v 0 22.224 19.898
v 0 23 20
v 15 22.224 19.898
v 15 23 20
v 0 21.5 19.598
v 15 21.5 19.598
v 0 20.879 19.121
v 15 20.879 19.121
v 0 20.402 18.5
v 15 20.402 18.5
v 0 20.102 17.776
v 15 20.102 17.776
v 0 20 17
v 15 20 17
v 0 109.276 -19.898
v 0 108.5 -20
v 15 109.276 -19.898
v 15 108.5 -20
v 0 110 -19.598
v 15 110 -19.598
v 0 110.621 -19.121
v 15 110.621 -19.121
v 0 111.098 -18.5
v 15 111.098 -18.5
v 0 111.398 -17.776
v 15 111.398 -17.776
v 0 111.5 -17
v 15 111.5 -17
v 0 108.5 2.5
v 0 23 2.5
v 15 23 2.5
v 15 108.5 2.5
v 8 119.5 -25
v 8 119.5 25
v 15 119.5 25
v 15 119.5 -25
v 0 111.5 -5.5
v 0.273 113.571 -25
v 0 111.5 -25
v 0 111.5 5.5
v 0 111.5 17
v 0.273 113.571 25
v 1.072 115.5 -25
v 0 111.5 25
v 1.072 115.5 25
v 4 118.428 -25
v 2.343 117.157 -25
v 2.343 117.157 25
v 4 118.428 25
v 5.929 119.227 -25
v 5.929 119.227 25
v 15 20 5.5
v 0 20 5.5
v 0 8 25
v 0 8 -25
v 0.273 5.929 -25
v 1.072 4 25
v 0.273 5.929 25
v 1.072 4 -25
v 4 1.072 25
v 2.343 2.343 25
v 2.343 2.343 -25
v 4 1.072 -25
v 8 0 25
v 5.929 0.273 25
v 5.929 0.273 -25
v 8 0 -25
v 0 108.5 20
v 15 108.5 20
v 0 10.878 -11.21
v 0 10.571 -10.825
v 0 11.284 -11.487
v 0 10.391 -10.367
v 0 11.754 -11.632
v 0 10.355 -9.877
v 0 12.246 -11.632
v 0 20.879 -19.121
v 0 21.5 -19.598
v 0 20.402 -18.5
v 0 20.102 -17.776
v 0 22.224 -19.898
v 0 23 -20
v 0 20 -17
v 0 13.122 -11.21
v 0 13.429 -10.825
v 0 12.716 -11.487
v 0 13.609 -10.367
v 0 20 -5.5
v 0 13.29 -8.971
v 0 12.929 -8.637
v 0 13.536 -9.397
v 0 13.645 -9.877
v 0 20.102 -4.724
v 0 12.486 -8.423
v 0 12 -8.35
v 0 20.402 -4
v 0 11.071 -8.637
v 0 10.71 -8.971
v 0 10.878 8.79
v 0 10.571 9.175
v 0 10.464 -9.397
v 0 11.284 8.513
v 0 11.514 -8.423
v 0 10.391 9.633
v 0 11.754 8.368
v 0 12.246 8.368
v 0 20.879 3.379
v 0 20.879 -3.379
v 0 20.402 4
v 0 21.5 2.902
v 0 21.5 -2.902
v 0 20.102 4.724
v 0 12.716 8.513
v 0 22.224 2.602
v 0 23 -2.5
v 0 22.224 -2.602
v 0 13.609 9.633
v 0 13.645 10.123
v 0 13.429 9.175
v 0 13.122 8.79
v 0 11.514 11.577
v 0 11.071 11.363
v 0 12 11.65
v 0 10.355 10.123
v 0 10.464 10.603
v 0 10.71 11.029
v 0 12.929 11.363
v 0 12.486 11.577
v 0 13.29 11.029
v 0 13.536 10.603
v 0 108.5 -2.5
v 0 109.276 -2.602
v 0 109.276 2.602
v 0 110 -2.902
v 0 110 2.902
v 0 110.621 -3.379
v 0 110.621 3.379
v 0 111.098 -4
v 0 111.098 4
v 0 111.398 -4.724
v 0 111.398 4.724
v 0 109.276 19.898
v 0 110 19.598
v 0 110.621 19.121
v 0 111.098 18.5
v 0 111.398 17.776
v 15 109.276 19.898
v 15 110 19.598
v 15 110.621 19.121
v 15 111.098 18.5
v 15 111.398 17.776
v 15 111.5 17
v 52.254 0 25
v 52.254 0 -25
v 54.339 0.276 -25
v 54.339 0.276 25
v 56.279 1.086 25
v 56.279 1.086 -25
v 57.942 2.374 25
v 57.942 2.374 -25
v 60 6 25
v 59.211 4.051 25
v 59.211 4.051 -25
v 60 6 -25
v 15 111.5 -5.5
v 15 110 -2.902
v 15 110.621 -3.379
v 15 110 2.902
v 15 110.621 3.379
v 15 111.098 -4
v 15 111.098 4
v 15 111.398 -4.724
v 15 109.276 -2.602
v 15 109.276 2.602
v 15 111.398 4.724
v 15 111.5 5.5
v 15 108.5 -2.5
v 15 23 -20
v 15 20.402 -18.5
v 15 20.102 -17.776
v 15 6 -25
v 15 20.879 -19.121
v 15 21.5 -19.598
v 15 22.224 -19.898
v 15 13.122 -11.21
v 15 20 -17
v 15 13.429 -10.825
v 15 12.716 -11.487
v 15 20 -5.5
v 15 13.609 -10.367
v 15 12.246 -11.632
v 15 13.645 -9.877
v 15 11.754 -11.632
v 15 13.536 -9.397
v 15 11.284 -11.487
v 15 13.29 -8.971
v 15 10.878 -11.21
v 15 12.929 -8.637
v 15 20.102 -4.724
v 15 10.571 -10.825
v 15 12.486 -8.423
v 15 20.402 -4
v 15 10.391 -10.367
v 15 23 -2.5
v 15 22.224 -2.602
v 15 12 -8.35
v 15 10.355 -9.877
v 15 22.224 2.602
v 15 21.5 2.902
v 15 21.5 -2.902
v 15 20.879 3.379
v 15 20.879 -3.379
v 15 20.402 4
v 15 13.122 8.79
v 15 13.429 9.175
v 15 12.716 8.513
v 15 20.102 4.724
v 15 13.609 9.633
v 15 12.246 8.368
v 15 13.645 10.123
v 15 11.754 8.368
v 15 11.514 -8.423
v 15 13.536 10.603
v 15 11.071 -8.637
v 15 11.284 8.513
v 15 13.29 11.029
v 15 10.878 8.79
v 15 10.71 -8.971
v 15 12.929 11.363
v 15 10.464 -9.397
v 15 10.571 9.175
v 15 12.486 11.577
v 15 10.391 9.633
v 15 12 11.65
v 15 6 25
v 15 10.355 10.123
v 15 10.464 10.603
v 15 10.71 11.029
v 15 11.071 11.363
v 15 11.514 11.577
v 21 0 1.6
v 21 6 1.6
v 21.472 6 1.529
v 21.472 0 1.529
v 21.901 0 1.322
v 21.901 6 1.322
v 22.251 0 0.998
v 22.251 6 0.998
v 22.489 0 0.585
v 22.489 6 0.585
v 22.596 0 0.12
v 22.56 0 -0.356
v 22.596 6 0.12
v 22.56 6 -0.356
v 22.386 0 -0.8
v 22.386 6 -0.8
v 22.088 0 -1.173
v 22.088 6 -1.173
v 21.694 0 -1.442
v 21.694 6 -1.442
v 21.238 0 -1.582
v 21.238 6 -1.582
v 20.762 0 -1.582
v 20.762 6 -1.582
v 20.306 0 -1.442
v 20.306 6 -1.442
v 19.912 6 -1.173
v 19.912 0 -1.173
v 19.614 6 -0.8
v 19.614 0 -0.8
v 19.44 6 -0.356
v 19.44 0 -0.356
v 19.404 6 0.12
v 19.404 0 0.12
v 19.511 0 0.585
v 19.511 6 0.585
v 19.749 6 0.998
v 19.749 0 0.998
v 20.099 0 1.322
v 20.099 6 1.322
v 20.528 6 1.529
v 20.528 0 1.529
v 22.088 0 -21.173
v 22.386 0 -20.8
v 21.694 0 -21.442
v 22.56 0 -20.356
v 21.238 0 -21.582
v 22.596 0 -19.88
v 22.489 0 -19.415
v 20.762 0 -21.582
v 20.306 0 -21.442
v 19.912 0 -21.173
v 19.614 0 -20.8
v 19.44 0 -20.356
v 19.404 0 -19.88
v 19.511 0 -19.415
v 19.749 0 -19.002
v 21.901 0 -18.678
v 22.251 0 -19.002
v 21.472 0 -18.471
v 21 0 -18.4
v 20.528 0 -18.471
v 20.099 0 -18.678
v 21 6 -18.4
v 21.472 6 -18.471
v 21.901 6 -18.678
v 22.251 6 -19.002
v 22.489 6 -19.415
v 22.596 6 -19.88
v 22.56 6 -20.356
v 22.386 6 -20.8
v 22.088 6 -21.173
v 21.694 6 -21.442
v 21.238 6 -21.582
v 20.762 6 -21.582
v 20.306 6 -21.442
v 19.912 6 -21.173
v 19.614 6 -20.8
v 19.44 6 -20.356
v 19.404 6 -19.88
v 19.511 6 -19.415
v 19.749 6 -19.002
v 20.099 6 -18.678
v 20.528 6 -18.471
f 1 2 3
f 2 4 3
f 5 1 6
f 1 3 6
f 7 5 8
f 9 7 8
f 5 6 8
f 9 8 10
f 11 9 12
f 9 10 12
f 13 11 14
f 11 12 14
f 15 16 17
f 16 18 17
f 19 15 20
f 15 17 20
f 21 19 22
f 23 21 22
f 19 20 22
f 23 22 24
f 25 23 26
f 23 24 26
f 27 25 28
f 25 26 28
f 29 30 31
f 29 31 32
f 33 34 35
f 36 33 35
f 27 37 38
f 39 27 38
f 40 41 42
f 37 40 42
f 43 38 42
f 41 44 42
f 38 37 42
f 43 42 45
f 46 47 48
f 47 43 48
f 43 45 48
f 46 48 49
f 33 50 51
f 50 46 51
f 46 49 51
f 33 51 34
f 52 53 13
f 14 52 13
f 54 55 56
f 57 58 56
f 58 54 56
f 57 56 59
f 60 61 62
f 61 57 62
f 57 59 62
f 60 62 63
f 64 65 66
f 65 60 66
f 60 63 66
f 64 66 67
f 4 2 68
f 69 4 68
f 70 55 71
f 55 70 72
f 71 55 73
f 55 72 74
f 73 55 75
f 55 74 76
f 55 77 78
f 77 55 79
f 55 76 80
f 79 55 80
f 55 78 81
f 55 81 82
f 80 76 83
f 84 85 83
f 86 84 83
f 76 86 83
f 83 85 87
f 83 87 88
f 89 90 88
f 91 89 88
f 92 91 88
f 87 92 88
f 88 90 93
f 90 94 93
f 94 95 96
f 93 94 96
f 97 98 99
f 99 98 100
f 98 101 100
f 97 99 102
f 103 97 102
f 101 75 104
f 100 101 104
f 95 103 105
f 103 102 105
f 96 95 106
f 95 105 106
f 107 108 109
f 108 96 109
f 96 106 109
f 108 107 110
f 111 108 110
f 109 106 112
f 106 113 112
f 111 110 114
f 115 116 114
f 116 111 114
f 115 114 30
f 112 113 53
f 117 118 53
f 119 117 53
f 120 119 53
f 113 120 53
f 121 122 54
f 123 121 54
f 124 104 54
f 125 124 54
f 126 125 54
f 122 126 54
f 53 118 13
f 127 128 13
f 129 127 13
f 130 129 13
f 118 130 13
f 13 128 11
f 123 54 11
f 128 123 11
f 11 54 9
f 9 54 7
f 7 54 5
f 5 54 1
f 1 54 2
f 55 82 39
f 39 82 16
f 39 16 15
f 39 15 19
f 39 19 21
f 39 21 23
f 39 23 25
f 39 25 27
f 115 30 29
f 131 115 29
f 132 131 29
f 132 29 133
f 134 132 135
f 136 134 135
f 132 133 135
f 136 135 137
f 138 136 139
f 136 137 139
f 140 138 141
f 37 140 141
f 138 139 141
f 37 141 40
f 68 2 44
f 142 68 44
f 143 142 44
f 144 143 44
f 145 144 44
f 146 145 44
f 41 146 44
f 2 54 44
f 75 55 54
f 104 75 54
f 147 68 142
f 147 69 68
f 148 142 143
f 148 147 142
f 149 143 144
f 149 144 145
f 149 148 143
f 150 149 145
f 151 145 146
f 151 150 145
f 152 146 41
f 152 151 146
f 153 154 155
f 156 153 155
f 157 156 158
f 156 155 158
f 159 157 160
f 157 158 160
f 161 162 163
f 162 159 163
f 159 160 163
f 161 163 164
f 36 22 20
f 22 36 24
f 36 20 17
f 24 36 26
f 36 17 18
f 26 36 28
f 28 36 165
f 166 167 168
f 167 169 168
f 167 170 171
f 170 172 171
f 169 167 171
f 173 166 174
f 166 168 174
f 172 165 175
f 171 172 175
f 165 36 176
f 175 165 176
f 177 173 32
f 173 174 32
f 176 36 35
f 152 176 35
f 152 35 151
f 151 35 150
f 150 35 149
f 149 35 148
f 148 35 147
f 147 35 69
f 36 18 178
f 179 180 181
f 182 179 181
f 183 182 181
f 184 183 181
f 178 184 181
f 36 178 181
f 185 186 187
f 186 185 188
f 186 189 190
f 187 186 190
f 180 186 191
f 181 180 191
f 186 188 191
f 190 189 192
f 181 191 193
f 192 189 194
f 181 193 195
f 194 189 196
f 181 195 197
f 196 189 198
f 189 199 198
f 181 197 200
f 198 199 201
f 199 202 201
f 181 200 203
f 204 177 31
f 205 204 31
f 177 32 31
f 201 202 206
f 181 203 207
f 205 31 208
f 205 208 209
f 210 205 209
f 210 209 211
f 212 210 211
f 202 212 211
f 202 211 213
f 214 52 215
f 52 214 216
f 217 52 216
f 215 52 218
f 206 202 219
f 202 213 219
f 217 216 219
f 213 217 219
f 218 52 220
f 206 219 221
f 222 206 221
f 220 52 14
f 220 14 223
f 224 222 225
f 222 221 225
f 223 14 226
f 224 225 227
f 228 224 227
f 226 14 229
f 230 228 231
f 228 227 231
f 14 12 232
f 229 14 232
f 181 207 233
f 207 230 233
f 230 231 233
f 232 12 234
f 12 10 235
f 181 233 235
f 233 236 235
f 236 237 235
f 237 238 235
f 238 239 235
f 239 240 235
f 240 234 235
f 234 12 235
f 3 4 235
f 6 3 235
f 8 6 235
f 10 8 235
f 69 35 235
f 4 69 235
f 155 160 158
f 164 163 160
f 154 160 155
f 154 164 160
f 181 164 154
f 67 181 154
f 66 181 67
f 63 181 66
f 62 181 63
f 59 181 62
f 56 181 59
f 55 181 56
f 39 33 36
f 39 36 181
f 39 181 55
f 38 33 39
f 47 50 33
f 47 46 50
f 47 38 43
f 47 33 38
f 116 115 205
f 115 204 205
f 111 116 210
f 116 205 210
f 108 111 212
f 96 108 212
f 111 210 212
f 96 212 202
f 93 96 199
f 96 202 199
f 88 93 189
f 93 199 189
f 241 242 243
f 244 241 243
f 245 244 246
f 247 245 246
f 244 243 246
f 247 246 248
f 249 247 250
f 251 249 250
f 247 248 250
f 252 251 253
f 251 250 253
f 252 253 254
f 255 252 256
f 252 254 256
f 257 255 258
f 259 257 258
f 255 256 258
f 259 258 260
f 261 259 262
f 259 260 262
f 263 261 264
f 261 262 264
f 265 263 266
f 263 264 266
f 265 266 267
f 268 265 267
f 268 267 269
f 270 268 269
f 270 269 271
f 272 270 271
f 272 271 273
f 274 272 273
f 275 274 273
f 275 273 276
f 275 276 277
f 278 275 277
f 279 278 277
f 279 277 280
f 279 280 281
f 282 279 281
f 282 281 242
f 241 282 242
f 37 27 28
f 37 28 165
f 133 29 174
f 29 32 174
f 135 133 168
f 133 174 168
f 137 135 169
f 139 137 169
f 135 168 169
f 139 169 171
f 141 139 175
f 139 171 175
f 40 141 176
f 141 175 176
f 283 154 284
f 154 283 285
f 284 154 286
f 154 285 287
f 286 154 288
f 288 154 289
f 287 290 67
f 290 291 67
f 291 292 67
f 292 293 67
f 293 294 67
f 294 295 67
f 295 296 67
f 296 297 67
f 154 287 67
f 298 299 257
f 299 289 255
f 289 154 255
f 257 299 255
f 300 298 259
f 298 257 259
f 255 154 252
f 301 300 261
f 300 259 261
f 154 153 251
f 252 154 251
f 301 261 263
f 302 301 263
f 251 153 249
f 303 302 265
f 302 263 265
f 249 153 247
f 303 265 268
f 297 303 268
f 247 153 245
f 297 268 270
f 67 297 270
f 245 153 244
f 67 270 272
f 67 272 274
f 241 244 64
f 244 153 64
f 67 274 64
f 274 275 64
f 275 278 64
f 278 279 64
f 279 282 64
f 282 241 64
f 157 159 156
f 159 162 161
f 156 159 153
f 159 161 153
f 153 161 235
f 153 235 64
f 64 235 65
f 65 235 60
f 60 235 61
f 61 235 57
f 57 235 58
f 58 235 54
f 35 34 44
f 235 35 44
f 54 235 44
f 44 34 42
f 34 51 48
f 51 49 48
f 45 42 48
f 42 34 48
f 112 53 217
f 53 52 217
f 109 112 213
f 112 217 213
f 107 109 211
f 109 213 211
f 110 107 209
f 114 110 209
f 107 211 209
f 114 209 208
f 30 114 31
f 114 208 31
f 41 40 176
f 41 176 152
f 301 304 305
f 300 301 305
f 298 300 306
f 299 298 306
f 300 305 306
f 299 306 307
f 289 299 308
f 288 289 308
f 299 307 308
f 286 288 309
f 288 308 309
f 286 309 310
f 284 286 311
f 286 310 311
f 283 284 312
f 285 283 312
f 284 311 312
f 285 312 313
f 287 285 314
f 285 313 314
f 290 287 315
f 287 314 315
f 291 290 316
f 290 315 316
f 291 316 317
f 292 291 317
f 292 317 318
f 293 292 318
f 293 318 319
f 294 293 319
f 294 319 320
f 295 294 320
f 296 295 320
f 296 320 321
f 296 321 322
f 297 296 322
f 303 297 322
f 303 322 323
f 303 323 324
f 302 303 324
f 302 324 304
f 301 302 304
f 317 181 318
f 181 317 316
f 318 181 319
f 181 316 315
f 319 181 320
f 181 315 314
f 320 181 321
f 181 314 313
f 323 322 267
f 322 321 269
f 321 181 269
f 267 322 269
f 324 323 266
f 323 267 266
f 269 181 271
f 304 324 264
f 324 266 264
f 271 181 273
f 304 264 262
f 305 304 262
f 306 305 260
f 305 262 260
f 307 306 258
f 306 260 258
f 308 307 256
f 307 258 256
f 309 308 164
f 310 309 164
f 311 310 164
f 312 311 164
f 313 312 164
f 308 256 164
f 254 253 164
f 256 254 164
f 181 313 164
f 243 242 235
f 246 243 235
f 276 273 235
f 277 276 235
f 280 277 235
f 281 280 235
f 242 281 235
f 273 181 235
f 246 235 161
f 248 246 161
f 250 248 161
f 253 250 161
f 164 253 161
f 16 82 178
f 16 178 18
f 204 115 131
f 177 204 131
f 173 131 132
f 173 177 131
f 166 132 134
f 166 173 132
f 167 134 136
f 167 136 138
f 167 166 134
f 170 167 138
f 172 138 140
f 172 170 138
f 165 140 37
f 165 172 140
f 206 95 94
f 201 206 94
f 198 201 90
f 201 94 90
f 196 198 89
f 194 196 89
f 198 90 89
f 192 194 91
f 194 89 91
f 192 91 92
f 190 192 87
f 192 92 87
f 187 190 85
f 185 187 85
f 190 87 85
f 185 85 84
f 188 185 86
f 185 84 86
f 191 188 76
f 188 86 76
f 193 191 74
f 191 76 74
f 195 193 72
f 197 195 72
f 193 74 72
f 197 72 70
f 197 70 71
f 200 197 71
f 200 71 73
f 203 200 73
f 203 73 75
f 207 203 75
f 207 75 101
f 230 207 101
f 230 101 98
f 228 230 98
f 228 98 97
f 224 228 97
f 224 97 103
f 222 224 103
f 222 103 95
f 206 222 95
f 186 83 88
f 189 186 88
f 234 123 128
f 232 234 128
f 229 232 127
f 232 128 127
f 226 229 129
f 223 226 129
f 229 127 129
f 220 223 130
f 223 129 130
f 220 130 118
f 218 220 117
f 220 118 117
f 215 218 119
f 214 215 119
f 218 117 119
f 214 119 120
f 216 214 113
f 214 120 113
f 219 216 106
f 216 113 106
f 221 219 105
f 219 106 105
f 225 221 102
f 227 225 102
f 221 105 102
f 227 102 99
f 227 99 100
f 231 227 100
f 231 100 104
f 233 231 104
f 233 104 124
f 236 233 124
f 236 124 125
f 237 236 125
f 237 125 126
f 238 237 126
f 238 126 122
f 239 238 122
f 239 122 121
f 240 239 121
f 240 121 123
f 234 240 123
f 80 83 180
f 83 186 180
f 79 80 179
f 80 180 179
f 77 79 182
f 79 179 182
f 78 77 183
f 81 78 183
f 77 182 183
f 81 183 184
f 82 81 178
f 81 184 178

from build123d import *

# Parameters (mm, degrees)
EXTRUDE_1_DEPTH     = 25
FILLET_1_R          = 8
SKETCH_2_R          = 1.65
CUT_EXTRUDE_1_DEPTH = 137.034003102
SKETCH_3_R          = 1.6
CUT_EXTRUDE_2_DEPTH = 131.794686436
SKETCH_4_W          = 17.5
SKETCH_4_H          = 91.5
CUT_EXTRUDE_3_DEPTH = 137.034003102
FILLET_2_R          = 3


with BuildPart() as part:
    # 草图1 → 凸台-拉伸1 (new, symmetric)
    with BuildSketch(Plane.XY):
        Polygon((0, 0), (0, 119.5), (15, 119.5), (15, 6), (60, 6), (60, 0), align=None)
    extrude(amount=EXTRUDE_1_DEPTH, both=True)

    # 圆角1
    # the kernel refuses this fillet: 8 mm, written as the material it takes off along each edge
    with BuildSketch(Plane(origin=(0, 119.5, 45), x_dir=(0, -1, 0), z_dir=(0, 0, -1)), Plane(origin=(0, 0, -45), x_dir=(0, 1, 0), z_dir=(0, 0, 1))) as fillet_1_piece_1:
        with BuildLine():
            CenterArc((FILLET_1_R, -FILLET_1_R), FILLET_1_R, 90, 90)
            Line((0, -FILLET_1_R), (-FILLET_1_R * 0.02, -FILLET_1_R))
            Line((-FILLET_1_R * 0.02, -FILLET_1_R), (-FILLET_1_R * 0.02, FILLET_1_R * 0.02))
            Line((-FILLET_1_R * 0.02, FILLET_1_R * 0.02), (FILLET_1_R, FILLET_1_R * 0.02))
            Line((FILLET_1_R, FILLET_1_R * 0.02), (FILLET_1_R, 0))
        make_face()
    extrude(amount=90, mode=Mode.SUBTRACT)
    with BuildSketch(Plane(origin=(60, 0, -44.364916731), x_dir=(0, 1, 0), z_dir=(0, 0, 1))) as fillet_1_piece_2:
        with BuildLine():
            CenterArc((8, 7.745966692), FILLET_1_R, 180, 75.522487814)
            Line((0, 7.745966692), (-0.16, 7.745966692))
            Line((-0.16, 7.745966692), (-0.16, 0))
            Line((-0.16, 0), (0, -0.16))
            ThreePointArc((0, -0.16), (3, -0.16), (5.96, -0.154919334))
            Line((5.96, -0.154919334), (6, 0))
        make_face()
    extrude(amount=88.729833462, mode=Mode.SUBTRACT)

    # 草图2 → 切除-拉伸1 (cut, through all)
    with BuildSketch(Plane.ZY):
        with Locations((10, 12)):
            Circle(SKETCH_2_R)
        with Locations((-10, 12)):
            Circle(SKETCH_2_R)
    extrude(amount=-CUT_EXTRUDE_1_DEPTH, mode=Mode.SUBTRACT)

    # 草图3 → 切除-拉伸2 (cut, through all)
    with BuildSketch(Plane(origin=(0, 6, 0), x_dir=(1, 0, 0), z_dir=(0, 1, 0))):
        with Locations(Location((21, 0, 0), (0, 0, 270))):
            Circle(SKETCH_3_R)
        with Locations(Location((21, 20, 0), (0, 0, 270))):
            Circle(SKETCH_3_R)
    extrude(amount=-CUT_EXTRUDE_2_DEPTH, mode=Mode.SUBTRACT)

    # 草图4 → 切除-拉伸3 (cut, through all)
    with BuildSketch(Plane.ZY):
        with Locations((-11.25, 65.75)):
            Rectangle(SKETCH_4_W, SKETCH_4_H)
        with Locations((11.25, 65.75)):
            Rectangle(SKETCH_4_W, SKETCH_4_H)
    extrude(amount=-CUT_EXTRUDE_3_DEPTH, mode=Mode.SUBTRACT)

    # 圆角2
    fillet_2_edges = [part.edges().sort_by_distance(p)[0] for p in [
        (7.5, 111.5, -20),
        (7.5, 20, -2.5),
        (7.5, 20, -20),
        (7.5, 111.5, -2.5),
        (7.5, 111.5, 2.5),
        (7.5, 20, 20),
        (7.5, 20, 2.5),
        (7.5, 111.5, 20),
    ]]
    fillet(fillet_2_edges, radius=FILLET_2_R)


solid = part.part
